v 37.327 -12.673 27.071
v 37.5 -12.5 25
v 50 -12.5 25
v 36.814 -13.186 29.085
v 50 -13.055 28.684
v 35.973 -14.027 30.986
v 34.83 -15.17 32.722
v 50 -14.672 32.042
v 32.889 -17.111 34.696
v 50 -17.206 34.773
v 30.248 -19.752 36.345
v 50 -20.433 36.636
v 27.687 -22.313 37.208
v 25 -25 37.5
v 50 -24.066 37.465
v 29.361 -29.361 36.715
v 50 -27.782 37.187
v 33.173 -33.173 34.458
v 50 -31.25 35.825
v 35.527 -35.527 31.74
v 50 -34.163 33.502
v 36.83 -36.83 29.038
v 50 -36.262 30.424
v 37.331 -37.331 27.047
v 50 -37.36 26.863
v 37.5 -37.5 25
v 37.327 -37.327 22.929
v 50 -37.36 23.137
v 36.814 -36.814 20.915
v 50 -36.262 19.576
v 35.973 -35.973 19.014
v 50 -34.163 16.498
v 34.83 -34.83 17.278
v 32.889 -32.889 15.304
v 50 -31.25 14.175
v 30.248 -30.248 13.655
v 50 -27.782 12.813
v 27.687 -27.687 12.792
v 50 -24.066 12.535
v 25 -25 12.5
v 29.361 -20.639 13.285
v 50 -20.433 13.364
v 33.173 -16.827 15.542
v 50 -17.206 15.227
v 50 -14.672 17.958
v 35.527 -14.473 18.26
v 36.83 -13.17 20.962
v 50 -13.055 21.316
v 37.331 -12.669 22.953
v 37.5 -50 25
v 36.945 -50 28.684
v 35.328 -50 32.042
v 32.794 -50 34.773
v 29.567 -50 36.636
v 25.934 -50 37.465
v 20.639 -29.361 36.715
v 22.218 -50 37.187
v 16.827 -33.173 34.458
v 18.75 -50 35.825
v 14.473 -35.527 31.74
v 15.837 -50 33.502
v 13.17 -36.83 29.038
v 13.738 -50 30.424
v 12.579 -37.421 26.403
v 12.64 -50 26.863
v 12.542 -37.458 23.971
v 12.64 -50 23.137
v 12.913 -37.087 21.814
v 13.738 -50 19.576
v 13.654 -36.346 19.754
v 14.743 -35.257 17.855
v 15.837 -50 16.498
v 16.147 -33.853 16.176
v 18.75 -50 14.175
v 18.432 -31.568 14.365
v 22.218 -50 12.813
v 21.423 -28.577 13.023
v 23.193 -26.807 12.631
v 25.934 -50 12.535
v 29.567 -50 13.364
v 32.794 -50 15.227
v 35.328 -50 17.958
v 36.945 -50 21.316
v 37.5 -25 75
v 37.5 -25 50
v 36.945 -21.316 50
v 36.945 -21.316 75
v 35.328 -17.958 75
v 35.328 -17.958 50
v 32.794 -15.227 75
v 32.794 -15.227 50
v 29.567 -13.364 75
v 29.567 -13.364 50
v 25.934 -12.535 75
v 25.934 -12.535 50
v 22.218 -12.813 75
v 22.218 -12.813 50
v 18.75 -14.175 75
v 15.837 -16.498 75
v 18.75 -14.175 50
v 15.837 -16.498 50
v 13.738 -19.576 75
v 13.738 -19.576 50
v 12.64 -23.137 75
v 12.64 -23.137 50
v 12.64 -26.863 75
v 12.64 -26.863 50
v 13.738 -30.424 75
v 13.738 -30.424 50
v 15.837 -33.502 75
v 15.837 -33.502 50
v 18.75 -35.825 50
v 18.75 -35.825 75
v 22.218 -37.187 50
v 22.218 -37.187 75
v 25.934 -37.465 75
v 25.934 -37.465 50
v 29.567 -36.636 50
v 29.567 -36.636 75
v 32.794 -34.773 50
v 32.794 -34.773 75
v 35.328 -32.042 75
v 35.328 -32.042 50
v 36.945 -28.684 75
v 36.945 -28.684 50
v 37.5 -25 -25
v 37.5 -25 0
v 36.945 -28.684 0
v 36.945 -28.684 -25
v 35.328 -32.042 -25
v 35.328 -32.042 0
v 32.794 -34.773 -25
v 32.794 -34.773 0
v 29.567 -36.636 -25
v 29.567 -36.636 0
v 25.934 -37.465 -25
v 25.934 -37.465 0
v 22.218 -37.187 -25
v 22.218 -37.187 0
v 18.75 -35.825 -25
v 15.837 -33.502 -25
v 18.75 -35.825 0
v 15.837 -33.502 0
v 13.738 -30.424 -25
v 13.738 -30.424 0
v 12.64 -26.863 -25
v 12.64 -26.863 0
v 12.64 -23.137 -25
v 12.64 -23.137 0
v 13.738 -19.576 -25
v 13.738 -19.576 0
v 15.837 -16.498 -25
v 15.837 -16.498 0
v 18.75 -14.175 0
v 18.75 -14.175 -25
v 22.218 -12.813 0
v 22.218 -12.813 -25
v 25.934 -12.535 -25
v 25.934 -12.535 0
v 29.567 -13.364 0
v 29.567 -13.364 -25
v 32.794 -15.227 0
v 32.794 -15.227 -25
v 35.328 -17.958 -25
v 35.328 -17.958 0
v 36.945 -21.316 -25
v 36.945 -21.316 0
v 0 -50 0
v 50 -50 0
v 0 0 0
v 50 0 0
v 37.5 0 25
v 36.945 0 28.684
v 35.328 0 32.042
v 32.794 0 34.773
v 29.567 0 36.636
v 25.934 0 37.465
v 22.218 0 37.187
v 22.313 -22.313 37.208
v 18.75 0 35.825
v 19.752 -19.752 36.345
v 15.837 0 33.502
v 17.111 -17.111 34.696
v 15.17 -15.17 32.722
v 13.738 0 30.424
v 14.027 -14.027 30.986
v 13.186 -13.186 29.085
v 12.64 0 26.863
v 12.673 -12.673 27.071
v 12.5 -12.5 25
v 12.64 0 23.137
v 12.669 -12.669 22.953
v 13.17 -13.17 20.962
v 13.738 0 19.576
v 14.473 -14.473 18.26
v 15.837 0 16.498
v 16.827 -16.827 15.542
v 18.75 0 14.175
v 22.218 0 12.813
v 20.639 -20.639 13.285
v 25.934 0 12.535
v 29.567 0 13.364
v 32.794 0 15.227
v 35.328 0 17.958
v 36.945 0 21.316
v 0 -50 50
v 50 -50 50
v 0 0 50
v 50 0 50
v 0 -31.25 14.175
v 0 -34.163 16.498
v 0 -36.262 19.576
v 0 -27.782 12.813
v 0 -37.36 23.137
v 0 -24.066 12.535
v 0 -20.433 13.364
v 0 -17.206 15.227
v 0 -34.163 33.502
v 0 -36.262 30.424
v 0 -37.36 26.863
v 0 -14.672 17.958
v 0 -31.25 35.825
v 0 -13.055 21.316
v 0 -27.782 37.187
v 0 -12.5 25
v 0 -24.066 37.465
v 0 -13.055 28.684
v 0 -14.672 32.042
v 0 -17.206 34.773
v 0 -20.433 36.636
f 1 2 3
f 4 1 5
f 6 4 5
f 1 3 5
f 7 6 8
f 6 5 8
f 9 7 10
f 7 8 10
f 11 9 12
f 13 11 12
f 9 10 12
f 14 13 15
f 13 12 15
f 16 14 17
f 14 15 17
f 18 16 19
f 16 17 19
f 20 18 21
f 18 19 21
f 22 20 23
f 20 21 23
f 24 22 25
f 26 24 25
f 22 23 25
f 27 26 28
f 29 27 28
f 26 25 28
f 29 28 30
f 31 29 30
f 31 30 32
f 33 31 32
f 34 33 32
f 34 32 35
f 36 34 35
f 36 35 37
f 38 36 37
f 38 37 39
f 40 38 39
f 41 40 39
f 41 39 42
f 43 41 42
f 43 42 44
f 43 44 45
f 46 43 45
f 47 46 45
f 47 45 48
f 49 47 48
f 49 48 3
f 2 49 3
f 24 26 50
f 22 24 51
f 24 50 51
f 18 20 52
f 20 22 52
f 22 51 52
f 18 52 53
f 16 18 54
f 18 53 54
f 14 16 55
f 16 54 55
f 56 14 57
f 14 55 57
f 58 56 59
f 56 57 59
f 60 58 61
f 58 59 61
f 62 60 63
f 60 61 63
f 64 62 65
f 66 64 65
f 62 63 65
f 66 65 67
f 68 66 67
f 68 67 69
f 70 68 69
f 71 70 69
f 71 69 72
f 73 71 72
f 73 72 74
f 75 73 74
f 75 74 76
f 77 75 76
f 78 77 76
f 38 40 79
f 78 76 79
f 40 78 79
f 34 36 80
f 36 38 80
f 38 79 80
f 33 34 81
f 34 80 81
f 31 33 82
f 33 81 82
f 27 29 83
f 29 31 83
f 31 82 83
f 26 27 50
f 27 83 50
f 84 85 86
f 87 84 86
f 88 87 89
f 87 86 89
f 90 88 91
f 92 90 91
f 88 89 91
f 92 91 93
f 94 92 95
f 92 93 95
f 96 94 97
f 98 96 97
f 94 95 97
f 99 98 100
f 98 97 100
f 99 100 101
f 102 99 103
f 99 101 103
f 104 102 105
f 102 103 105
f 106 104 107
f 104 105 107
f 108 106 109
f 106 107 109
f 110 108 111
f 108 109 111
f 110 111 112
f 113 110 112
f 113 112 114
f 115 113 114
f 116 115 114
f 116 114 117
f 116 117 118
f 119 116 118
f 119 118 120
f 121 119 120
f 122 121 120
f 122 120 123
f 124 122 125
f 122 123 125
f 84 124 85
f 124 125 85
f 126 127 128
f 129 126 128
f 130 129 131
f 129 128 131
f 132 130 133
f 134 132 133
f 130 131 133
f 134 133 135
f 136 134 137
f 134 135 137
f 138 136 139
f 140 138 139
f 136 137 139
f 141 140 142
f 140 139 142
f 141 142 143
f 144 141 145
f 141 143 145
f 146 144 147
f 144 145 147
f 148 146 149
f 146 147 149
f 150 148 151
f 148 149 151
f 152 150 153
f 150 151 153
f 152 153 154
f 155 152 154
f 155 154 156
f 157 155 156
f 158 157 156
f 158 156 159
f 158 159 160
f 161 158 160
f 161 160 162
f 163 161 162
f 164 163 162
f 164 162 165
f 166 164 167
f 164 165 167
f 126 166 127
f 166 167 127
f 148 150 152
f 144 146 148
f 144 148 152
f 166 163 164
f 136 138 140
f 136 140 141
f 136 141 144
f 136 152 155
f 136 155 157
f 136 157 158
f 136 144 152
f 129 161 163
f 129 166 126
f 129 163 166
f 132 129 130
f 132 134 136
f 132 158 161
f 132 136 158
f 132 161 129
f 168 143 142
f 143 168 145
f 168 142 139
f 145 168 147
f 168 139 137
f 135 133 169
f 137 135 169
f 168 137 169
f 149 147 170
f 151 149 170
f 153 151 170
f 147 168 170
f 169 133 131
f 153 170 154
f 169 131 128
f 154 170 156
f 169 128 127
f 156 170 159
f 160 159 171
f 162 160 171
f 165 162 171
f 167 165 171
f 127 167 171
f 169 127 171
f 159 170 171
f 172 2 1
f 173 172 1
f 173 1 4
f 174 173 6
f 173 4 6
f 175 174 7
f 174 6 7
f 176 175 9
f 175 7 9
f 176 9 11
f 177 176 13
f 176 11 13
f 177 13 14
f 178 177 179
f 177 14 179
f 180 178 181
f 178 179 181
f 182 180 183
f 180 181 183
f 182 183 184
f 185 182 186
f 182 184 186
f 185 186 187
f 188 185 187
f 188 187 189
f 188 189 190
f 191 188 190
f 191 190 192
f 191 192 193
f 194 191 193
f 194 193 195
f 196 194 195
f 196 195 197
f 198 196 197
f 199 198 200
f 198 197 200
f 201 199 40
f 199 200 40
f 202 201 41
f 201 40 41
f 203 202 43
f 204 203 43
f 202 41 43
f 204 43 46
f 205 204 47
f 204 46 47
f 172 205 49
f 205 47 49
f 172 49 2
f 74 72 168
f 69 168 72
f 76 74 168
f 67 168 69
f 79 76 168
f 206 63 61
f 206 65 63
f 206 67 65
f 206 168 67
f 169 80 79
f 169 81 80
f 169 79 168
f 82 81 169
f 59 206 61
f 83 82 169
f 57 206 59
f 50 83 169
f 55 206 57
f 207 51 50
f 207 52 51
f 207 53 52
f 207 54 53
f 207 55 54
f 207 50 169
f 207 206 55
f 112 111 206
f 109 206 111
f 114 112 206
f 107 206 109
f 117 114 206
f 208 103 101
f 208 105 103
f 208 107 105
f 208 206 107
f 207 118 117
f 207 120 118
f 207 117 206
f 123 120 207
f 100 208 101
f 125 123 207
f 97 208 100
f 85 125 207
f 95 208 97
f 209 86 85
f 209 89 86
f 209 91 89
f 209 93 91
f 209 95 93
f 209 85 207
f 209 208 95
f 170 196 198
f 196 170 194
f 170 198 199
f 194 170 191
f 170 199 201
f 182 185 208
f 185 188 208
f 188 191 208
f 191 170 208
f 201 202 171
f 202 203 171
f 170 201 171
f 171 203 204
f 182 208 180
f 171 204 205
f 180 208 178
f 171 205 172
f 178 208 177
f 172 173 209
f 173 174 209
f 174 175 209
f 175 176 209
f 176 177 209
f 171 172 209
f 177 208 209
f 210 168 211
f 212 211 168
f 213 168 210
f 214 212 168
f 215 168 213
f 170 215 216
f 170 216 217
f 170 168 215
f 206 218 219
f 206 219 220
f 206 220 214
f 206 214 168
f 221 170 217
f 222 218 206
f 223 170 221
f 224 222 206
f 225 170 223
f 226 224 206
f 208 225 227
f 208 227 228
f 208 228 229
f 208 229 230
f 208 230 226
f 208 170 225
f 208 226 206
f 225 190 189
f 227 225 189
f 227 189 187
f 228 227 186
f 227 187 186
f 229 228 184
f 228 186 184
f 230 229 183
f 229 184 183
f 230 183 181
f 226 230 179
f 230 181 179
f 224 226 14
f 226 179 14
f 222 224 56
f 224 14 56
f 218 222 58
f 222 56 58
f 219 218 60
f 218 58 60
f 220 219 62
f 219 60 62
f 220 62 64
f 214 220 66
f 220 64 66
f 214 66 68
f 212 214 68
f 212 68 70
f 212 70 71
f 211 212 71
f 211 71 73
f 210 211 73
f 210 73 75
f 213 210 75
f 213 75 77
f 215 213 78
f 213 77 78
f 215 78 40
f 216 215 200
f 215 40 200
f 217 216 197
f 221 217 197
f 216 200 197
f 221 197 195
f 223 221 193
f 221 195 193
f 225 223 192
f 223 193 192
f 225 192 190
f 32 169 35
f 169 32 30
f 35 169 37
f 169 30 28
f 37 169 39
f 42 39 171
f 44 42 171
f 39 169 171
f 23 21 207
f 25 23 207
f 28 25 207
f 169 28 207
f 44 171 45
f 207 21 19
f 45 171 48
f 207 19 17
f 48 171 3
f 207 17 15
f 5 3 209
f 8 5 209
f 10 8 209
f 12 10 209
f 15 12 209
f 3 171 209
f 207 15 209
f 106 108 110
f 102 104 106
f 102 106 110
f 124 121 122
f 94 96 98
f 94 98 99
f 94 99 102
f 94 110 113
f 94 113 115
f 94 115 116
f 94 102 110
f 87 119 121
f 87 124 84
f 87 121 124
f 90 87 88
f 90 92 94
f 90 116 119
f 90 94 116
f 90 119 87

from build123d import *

# Parameters (mm, degrees)
F0_W     = 50
F0_H     = 50
F1_DEPTH = 50
F2_R     = 12.5
F3_DEPTH = 25
F4_R     = 12.5
F5_DEPTH = 50
F6_R     = 12.5
F7_DEPTH = 50
F8_R     = 12.5
F9_DEPTH = 25


with BuildPart() as f1:
    # F0 (on Front) → F1 (new body)
    with BuildSketch(Plane.XZ):
        with Locations((25, 25)):
            Rectangle(F0_W, F0_H)
    extrude(amount=F1_DEPTH)

    # F2 (on face) → F3 (join)
    with BuildSketch(Plane.XY.offset(50)):
        with Locations((25, -25)):
            Circle(F2_R)
    extrude(amount=F3_DEPTH)

    # F4 (on face) → F5 (cut)
    with BuildSketch(Plane.YZ.offset(50)):
        with Locations((-25, 25)):
            Circle(F4_R)
    extrude(amount=-F5_DEPTH, mode=Mode.SUBTRACT)

    # F6 (on face) → F7 (cut)
    with BuildSketch(Plane.XZ.offset(50)):
        with Locations((25, 25)):
            Circle(F6_R)
    extrude(amount=-F7_DEPTH, mode=Mode.SUBTRACT)

    # F8 (on face) → F9 (join)
    with BuildSketch(Plane(origin=(0, 0, 0), x_dir=(1, 0, 0), z_dir=(0, 0, -1))):
        with Locations((25, 25)):
            Circle(F8_R)
    extrude(amount=F9_DEPTH)


solid = f1.part
